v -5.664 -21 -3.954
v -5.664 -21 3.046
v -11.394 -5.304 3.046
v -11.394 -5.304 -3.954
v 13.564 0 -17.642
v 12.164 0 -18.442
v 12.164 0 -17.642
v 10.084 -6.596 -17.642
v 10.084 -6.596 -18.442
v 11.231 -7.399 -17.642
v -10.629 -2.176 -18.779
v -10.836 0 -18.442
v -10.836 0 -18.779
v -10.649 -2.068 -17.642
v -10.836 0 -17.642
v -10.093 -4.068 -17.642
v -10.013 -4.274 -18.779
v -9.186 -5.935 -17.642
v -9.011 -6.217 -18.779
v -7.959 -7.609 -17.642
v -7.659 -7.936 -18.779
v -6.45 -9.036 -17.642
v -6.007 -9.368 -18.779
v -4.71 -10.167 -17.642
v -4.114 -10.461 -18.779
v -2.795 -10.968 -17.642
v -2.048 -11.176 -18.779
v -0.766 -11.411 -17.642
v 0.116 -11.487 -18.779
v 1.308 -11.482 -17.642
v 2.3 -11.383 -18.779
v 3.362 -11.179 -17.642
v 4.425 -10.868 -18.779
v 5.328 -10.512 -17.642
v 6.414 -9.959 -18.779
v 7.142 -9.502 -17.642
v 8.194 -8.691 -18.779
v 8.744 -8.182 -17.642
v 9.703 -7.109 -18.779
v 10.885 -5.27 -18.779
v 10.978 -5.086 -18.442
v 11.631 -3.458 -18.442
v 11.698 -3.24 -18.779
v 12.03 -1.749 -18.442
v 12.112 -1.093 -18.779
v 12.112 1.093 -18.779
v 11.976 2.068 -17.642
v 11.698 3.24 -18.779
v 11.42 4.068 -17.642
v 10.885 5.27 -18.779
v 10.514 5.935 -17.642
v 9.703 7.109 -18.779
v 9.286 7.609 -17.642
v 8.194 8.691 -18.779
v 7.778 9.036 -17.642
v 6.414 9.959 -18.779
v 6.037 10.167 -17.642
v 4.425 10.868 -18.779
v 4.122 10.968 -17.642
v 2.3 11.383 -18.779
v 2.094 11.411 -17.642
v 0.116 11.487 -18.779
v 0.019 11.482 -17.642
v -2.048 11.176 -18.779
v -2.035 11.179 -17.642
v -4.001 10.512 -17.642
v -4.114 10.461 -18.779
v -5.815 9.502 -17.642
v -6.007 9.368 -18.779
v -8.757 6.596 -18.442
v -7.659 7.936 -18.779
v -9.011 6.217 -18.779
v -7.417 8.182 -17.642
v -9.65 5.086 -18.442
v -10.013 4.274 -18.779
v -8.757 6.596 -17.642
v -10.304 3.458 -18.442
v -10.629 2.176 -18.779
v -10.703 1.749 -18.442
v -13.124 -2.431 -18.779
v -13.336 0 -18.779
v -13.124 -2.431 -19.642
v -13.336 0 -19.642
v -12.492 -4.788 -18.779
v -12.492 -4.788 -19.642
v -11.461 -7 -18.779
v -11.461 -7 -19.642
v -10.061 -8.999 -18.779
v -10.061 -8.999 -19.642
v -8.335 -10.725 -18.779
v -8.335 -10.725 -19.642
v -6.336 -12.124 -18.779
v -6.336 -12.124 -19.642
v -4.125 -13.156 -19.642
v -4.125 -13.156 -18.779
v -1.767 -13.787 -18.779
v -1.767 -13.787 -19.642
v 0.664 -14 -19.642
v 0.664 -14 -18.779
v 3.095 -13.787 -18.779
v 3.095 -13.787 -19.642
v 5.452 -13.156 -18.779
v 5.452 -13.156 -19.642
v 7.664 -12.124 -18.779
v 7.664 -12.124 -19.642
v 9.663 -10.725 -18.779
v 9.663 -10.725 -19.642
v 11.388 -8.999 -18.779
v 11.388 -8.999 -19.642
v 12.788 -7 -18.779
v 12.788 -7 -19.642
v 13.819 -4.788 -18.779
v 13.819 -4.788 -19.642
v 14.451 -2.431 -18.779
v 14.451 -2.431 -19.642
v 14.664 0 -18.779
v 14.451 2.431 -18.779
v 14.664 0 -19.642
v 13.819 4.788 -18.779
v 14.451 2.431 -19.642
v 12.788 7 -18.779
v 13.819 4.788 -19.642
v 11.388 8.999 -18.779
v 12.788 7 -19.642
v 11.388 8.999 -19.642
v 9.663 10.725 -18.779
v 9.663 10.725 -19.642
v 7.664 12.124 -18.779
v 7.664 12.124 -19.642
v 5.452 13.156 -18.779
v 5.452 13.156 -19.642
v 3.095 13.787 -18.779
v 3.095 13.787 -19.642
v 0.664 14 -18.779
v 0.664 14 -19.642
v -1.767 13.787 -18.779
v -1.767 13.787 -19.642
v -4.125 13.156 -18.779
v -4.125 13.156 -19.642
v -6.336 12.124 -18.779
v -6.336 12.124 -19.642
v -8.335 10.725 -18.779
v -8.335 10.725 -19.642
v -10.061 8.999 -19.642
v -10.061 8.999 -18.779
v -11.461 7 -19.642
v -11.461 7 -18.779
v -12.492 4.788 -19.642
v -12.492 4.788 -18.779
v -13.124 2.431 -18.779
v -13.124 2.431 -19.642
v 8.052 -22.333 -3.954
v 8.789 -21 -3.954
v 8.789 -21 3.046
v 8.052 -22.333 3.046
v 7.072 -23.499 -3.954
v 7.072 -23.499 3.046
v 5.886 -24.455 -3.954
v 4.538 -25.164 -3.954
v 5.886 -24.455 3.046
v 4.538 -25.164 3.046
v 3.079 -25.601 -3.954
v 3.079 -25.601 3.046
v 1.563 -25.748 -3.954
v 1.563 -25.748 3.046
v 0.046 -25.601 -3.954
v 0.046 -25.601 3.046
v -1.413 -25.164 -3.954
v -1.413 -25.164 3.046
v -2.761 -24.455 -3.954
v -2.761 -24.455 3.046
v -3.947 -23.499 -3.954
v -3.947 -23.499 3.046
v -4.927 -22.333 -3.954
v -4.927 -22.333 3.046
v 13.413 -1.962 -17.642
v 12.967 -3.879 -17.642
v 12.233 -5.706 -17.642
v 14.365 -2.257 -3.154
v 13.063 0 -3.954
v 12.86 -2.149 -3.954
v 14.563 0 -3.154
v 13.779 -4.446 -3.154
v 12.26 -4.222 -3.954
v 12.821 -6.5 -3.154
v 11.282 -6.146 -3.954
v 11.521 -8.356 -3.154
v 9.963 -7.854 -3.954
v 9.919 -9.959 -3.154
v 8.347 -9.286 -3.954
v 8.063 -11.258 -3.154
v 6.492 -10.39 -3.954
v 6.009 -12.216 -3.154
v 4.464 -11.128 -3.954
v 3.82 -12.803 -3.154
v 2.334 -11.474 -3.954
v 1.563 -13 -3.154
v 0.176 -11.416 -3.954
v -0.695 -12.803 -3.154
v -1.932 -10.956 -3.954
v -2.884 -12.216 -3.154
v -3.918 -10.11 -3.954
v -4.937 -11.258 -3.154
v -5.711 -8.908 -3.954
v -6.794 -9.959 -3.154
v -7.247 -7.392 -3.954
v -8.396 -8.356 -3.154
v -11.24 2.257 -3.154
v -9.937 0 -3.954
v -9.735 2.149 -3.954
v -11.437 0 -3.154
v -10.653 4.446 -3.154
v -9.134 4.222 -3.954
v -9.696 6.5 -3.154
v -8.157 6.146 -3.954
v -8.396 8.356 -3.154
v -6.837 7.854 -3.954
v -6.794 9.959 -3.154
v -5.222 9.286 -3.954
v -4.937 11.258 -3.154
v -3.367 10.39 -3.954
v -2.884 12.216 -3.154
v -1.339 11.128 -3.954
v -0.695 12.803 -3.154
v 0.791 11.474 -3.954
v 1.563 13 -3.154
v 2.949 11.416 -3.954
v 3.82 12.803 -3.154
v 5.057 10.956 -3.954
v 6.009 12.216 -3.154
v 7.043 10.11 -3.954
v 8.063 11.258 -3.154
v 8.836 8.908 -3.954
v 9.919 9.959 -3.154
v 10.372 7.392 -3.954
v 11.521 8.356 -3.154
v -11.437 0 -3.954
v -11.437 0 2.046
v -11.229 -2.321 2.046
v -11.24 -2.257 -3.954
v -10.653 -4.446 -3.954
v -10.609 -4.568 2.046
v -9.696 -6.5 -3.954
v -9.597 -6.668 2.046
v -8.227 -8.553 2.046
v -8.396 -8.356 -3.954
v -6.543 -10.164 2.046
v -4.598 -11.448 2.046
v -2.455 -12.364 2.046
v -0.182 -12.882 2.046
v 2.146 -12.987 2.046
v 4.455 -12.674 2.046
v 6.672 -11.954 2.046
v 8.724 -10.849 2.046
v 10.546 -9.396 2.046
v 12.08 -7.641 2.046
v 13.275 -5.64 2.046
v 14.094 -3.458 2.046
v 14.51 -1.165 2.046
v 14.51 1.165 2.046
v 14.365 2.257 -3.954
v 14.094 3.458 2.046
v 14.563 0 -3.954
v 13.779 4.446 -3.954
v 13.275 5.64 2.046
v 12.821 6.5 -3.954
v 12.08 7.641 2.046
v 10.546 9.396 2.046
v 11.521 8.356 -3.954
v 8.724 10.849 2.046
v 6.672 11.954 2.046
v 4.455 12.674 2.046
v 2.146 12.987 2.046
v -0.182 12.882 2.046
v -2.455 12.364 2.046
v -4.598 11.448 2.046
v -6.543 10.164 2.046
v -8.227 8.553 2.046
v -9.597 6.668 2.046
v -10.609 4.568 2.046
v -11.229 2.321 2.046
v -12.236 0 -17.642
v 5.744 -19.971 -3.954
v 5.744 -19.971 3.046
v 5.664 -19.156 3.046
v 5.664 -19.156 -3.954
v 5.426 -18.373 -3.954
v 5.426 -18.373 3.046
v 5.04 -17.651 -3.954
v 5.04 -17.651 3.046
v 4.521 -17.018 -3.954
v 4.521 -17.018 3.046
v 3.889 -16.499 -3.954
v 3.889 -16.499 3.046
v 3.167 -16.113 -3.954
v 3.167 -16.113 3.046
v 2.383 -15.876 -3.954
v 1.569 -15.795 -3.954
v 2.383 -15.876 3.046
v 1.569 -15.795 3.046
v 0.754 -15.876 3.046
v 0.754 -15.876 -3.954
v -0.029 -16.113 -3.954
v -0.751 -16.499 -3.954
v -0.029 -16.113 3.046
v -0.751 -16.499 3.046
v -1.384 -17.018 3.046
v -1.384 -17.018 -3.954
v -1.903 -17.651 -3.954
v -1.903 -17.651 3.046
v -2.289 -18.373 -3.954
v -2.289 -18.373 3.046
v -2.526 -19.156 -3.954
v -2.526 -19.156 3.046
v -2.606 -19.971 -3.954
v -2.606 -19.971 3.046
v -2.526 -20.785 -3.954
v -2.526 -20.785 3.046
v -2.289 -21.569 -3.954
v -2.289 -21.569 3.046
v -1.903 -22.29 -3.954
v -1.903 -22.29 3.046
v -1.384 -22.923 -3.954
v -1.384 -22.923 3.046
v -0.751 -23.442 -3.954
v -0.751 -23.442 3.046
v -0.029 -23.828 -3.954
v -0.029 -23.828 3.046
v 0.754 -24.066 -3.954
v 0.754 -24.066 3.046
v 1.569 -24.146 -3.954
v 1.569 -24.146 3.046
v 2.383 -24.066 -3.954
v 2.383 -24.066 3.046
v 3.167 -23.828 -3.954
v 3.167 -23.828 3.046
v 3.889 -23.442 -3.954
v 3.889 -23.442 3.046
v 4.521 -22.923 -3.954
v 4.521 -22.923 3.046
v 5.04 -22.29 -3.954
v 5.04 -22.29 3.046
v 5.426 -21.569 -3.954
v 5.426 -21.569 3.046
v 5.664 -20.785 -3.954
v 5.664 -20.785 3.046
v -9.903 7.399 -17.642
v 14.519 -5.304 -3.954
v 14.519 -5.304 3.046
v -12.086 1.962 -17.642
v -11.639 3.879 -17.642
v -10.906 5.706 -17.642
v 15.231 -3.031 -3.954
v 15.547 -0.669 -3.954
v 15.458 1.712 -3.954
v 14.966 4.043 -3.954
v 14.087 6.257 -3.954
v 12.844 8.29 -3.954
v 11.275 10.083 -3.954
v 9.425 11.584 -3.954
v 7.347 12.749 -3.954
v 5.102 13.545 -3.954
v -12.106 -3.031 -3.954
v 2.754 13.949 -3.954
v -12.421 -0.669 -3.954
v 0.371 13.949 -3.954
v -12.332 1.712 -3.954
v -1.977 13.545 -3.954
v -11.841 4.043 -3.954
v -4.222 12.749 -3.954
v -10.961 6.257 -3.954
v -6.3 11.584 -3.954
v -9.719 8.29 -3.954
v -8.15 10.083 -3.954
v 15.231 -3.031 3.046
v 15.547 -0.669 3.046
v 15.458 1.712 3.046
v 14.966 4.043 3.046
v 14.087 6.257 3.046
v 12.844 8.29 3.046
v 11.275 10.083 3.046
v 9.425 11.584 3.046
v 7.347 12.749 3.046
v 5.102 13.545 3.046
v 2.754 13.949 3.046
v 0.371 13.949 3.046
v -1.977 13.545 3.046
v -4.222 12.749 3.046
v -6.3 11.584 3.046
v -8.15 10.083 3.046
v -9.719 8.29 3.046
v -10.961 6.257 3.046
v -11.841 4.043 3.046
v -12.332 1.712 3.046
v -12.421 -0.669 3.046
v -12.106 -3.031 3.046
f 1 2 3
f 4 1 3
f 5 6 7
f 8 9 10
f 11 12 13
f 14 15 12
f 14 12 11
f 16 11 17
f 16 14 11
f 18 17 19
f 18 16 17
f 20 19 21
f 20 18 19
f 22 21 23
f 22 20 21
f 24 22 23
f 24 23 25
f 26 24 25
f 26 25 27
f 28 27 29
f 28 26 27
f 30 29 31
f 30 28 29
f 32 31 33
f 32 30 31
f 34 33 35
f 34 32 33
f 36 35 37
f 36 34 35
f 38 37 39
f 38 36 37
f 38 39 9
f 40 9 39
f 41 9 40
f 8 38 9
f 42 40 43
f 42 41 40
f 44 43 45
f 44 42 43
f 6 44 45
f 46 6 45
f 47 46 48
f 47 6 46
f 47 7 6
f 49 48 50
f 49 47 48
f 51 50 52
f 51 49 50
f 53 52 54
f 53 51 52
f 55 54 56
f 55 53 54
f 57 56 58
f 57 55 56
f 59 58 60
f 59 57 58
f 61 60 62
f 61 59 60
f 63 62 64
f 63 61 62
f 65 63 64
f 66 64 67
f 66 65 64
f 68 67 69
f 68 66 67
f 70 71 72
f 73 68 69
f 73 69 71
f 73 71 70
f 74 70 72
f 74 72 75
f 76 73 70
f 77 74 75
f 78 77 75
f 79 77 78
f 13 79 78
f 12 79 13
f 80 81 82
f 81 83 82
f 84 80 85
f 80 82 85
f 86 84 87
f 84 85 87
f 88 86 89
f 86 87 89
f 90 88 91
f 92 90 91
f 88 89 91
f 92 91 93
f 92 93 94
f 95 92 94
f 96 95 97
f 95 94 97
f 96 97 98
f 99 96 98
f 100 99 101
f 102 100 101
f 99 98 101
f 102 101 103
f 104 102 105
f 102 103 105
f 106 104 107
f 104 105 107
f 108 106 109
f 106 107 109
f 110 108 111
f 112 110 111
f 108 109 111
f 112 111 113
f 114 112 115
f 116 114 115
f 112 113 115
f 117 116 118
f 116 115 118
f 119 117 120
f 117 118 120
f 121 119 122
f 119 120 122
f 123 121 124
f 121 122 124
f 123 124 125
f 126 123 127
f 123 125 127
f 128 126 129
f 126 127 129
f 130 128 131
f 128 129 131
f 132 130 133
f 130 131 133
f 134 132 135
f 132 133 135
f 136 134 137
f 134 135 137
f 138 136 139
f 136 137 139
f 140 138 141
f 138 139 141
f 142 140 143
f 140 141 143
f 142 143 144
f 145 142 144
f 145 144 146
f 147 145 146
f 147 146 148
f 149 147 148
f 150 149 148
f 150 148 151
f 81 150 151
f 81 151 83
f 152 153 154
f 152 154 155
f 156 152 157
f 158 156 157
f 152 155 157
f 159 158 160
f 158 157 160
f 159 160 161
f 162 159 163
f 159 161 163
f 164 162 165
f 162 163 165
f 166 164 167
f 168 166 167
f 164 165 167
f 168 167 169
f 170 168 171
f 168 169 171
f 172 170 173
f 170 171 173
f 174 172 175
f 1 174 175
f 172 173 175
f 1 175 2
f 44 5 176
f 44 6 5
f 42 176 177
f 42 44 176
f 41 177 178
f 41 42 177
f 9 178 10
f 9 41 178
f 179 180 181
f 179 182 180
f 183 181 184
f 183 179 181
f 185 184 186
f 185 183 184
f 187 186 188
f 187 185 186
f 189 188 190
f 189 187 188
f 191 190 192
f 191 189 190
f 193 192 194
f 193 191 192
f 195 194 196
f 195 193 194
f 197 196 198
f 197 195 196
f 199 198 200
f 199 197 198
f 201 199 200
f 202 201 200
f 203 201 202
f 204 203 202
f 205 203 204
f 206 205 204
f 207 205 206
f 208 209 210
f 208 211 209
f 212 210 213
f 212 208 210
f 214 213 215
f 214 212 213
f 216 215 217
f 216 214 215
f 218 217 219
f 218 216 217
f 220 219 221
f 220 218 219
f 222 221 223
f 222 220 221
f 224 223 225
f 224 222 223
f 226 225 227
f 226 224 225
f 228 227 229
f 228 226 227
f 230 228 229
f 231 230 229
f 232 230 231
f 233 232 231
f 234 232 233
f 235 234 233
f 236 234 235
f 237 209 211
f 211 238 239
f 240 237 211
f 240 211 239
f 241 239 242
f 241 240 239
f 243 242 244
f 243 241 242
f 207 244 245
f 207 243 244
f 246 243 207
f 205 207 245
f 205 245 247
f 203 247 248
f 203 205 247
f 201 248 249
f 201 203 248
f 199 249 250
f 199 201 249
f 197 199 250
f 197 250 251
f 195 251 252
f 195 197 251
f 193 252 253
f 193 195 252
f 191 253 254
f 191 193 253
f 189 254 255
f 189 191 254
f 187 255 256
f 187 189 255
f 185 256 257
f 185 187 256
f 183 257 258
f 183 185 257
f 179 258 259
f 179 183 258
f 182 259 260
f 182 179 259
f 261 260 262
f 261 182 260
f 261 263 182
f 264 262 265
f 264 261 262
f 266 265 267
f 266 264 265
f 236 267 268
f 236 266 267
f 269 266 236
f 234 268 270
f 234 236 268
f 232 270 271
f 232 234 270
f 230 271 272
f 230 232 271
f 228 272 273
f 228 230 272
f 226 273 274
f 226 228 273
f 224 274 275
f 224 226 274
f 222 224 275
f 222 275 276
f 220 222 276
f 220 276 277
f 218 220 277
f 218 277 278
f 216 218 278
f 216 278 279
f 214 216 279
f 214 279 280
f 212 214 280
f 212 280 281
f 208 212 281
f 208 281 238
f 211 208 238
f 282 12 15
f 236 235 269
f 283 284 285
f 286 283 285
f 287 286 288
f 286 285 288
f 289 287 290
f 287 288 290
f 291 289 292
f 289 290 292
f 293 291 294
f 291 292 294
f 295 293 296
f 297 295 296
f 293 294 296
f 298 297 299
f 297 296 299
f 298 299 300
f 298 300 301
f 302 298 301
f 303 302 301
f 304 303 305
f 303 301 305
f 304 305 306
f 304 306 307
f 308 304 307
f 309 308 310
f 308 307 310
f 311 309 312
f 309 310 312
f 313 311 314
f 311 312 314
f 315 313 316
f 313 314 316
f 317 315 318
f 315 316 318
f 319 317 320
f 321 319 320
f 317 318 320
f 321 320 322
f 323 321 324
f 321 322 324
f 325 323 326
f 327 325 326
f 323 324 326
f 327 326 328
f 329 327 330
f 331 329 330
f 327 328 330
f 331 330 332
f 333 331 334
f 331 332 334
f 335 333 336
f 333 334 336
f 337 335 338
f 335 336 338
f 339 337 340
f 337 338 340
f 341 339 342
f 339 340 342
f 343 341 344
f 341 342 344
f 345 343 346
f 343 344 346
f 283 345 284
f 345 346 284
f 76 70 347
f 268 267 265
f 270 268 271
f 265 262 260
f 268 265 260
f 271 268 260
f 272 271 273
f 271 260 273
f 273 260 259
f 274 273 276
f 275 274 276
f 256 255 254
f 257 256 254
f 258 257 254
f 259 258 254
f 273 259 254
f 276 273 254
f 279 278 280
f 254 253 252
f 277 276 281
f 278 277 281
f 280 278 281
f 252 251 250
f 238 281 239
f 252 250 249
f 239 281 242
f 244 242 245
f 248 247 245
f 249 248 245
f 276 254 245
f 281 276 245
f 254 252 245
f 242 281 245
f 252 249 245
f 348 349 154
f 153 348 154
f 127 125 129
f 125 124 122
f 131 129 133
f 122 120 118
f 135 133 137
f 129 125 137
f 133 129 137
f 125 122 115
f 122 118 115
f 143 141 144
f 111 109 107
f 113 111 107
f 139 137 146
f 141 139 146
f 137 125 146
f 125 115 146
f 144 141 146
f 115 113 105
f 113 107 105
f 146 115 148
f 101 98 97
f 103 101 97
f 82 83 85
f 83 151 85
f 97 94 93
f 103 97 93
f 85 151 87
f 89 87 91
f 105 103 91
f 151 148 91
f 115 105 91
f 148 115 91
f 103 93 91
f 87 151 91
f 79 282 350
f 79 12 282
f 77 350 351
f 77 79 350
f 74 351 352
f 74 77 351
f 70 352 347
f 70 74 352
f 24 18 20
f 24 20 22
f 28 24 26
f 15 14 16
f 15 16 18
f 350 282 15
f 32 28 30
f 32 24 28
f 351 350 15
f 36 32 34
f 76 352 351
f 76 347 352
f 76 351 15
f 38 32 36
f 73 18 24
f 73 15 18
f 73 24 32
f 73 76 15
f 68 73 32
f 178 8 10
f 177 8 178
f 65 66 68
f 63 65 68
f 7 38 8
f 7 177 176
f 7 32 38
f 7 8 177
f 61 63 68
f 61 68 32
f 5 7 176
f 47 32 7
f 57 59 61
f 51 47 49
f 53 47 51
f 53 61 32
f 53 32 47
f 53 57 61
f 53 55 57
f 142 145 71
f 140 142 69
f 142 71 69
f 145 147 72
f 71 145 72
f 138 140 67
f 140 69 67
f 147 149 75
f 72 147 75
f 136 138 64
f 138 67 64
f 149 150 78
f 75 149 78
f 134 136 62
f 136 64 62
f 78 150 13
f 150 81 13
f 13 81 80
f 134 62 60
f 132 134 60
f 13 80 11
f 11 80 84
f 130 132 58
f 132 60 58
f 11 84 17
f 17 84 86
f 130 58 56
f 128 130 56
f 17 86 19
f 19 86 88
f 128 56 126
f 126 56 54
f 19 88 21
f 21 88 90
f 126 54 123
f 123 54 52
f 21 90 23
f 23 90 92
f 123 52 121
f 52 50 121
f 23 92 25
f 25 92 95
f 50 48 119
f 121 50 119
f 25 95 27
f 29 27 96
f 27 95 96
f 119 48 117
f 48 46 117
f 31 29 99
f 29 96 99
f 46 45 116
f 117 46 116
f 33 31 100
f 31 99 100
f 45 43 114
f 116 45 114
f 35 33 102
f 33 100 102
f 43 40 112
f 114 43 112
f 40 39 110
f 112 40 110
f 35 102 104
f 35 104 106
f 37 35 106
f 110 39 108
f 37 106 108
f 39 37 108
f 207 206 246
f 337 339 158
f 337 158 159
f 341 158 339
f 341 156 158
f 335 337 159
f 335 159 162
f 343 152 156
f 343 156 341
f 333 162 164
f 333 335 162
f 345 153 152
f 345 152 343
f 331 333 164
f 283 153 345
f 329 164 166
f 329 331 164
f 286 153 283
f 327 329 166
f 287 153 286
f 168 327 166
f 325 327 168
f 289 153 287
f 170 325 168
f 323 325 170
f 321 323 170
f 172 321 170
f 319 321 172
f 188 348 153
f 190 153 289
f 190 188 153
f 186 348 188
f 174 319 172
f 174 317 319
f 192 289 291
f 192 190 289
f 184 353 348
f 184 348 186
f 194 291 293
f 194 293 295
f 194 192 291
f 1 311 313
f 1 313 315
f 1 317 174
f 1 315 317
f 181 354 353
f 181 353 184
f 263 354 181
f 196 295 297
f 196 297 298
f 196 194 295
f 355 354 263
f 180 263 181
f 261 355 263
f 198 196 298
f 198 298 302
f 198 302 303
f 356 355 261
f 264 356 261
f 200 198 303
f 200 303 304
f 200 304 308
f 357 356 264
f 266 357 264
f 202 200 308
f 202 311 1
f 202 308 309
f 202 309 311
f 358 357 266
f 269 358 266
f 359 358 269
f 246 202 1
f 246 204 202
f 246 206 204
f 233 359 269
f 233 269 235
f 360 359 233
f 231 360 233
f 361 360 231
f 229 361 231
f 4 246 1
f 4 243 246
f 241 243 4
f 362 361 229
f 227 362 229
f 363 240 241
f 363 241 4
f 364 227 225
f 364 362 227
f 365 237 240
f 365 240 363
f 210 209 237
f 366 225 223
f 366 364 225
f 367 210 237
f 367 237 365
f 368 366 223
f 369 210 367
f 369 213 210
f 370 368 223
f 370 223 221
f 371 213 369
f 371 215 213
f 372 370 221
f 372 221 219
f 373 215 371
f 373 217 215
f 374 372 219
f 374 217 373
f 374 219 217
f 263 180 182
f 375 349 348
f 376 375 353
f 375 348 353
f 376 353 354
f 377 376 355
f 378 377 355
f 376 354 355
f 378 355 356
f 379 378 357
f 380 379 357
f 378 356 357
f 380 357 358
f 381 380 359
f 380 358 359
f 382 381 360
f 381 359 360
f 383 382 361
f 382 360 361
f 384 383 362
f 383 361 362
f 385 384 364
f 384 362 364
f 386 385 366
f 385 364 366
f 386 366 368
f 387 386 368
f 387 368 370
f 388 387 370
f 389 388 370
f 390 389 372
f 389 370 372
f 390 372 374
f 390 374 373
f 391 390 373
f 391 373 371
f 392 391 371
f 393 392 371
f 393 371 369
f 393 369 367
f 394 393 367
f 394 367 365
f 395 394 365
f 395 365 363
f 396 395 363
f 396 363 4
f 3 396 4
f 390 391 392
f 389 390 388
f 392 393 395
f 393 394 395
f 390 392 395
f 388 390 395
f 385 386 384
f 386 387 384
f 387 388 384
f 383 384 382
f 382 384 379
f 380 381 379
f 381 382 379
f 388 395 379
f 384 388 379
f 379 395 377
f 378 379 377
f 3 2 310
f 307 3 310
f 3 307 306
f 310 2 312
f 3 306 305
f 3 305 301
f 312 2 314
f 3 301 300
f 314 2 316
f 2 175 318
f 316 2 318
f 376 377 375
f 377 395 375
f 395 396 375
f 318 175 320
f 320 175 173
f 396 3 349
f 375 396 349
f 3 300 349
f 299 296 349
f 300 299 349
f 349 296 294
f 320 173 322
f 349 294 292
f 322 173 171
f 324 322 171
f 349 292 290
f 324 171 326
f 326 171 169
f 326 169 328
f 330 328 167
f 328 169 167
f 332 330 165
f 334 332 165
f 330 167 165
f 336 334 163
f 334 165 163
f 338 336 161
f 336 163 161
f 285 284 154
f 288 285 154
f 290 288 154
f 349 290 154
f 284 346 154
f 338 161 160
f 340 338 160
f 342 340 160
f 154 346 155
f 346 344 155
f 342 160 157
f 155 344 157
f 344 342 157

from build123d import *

# Parameters (mm, degrees)
BOSS_EXTRU_4_DEPTH           = 7
ESQUISSE11_R                 = 4.175305872
ENL_V_MAT_EXTRU_2_DEPTH      = 7
R_VOLUTION3_ANGLE            = 35
R_P_TITION_CIRCULAIRE1_COUNT = 2
R_VOLUTION4_ANGLE            = 140
R_P_TITION_CIRCULAIRE2_COUNT = 2


with BuildPart() as part:
    # Esquisse1 → Révolution1 (revolve)
    with BuildSketch(Plane(origin=(1.309044262, 0, 0), x_dir=(1, 0, 0), z_dir=(0, 1, 0))):
        Polygon((0.253488225, -3.046040946), (-13.746511775, -3.046040946), (-13.746511775, 3.953959054), (-12.746511775, 3.953959054), (-12.746511775, 3.442939457), (-12.746511775, 2.953959054), (-12.746511775, -2.046040946), (0.253488225, -2.046040946), align=None)
    revolve(axis=Axis((1.562532487, 0, 2.046040946), (0, 0, 1)))

    # Esquisse10 → Boss.-Extru.4 (add)
    with BuildSketch(Plane.XY.offset(3.046040946)):
        with BuildLine():
            Line((14.88883966, -4.290633652), (8.788835843, -21))
            ThreePointArc((8.788835843, -21), (1.562532487, -25.748246952), (-5.663770869, -21))
            Line((-5.663770869, -21), (-11.763774686, -4.290633652))
            ThreePointArc((-11.763774686, -4.290633652), (1.562532487, -13.260227708), (14.88883966, -4.290633652))
        make_face()
    extrude(amount=-BOSS_EXTRU_4_DEPTH)

    # Esquisse11 → Enlèv. mat.-Extru.2 (cut)
    with BuildSketch(Plane.XY.offset(3.046040946)):
        with Locations((1.568835843, -19.970784203)):
            Circle(ESQUISSE11_R)
    extrude(amount=-ENL_V_MAT_EXTRU_2_DEPTH, mode=Mode.SUBTRACT)

    # Esquisse14 → Révolution4 (revolve)
    with BuildSketch(Plane(origin=(0, 0, 0), x_dir=(1, 0, 0), z_dir=(0, 1, 0))):
        Polygon((-11.437467513, 3.953959054), (-9.937467513, 3.953959054), (-11.437467513, 3.153959054), align=None)
    r_volution4 = revolve(axis=Axis((1.562532487, 0, 2.046040946), (0, 0, -1)), revolution_arc=R_VOLUTION4_ANGLE)

    # Répétition circulaire2: Révolution4 ×2 about axis
    r_p_tition_circulaire2_axis = Axis((1.562532487, 0, 0), (0, 0, 1))
    for i in range(1, R_P_TITION_CIRCULAIRE2_COUNT):
        add(r_volution4.rotate(r_p_tition_circulaire2_axis, i * 360 / R_P_TITION_CIRCULAIRE2_COUNT))


with BuildPart() as body_2:
    # Esquisse2 → Révolution2 (revolve)
    with BuildSketch(Plane(origin=(0, 0, -11.80070304), x_dir=(1, 0, 0), z_dir=(0, 1, 0))):
        Polygon((0.663591956, 5.841333496), (-10.836408044, 5.841333496), (-10.836408044, 6.365484161), (-10.836408044, 6.97833407), (-13.336408044, 6.97833407), (-13.336408044, 7.841333496), (0.663591956, 7.841333496), align=None)
    revolve(axis=Axis((0.663591956, 0, -19.642036537), (0, 0, 1)))

    # Esquisse13 → Révolution3 (revolve)
    with BuildSketch(Plane(origin=(0, 0, 0), x_dir=(1, 0, 0), z_dir=(0, 1, 0))):
        Polygon((-10.836408044, 17.642036537), (-12.236408044, 17.642036537), (-10.836408044, 18.442036537), align=None)
    r_volution3 = revolve(axis=Axis((0.663591956, 0, -17.642036537), (0, 0, -1)), revolution_arc=R_VOLUTION3_ANGLE)

    # Répétition circulaire1: Révolution3 ×2 about axis
    r_p_tition_circulaire1_axis = Axis((0.663591956, 0, 0), (0, 0, 1))
    for i in range(1, R_P_TITION_CIRCULAIRE1_COUNT):
        add(r_volution3.rotate(r_p_tition_circulaire1_axis, i * 360 / R_P_TITION_CIRCULAIRE1_COUNT))


solid = Compound([part.part, body_2.part])
